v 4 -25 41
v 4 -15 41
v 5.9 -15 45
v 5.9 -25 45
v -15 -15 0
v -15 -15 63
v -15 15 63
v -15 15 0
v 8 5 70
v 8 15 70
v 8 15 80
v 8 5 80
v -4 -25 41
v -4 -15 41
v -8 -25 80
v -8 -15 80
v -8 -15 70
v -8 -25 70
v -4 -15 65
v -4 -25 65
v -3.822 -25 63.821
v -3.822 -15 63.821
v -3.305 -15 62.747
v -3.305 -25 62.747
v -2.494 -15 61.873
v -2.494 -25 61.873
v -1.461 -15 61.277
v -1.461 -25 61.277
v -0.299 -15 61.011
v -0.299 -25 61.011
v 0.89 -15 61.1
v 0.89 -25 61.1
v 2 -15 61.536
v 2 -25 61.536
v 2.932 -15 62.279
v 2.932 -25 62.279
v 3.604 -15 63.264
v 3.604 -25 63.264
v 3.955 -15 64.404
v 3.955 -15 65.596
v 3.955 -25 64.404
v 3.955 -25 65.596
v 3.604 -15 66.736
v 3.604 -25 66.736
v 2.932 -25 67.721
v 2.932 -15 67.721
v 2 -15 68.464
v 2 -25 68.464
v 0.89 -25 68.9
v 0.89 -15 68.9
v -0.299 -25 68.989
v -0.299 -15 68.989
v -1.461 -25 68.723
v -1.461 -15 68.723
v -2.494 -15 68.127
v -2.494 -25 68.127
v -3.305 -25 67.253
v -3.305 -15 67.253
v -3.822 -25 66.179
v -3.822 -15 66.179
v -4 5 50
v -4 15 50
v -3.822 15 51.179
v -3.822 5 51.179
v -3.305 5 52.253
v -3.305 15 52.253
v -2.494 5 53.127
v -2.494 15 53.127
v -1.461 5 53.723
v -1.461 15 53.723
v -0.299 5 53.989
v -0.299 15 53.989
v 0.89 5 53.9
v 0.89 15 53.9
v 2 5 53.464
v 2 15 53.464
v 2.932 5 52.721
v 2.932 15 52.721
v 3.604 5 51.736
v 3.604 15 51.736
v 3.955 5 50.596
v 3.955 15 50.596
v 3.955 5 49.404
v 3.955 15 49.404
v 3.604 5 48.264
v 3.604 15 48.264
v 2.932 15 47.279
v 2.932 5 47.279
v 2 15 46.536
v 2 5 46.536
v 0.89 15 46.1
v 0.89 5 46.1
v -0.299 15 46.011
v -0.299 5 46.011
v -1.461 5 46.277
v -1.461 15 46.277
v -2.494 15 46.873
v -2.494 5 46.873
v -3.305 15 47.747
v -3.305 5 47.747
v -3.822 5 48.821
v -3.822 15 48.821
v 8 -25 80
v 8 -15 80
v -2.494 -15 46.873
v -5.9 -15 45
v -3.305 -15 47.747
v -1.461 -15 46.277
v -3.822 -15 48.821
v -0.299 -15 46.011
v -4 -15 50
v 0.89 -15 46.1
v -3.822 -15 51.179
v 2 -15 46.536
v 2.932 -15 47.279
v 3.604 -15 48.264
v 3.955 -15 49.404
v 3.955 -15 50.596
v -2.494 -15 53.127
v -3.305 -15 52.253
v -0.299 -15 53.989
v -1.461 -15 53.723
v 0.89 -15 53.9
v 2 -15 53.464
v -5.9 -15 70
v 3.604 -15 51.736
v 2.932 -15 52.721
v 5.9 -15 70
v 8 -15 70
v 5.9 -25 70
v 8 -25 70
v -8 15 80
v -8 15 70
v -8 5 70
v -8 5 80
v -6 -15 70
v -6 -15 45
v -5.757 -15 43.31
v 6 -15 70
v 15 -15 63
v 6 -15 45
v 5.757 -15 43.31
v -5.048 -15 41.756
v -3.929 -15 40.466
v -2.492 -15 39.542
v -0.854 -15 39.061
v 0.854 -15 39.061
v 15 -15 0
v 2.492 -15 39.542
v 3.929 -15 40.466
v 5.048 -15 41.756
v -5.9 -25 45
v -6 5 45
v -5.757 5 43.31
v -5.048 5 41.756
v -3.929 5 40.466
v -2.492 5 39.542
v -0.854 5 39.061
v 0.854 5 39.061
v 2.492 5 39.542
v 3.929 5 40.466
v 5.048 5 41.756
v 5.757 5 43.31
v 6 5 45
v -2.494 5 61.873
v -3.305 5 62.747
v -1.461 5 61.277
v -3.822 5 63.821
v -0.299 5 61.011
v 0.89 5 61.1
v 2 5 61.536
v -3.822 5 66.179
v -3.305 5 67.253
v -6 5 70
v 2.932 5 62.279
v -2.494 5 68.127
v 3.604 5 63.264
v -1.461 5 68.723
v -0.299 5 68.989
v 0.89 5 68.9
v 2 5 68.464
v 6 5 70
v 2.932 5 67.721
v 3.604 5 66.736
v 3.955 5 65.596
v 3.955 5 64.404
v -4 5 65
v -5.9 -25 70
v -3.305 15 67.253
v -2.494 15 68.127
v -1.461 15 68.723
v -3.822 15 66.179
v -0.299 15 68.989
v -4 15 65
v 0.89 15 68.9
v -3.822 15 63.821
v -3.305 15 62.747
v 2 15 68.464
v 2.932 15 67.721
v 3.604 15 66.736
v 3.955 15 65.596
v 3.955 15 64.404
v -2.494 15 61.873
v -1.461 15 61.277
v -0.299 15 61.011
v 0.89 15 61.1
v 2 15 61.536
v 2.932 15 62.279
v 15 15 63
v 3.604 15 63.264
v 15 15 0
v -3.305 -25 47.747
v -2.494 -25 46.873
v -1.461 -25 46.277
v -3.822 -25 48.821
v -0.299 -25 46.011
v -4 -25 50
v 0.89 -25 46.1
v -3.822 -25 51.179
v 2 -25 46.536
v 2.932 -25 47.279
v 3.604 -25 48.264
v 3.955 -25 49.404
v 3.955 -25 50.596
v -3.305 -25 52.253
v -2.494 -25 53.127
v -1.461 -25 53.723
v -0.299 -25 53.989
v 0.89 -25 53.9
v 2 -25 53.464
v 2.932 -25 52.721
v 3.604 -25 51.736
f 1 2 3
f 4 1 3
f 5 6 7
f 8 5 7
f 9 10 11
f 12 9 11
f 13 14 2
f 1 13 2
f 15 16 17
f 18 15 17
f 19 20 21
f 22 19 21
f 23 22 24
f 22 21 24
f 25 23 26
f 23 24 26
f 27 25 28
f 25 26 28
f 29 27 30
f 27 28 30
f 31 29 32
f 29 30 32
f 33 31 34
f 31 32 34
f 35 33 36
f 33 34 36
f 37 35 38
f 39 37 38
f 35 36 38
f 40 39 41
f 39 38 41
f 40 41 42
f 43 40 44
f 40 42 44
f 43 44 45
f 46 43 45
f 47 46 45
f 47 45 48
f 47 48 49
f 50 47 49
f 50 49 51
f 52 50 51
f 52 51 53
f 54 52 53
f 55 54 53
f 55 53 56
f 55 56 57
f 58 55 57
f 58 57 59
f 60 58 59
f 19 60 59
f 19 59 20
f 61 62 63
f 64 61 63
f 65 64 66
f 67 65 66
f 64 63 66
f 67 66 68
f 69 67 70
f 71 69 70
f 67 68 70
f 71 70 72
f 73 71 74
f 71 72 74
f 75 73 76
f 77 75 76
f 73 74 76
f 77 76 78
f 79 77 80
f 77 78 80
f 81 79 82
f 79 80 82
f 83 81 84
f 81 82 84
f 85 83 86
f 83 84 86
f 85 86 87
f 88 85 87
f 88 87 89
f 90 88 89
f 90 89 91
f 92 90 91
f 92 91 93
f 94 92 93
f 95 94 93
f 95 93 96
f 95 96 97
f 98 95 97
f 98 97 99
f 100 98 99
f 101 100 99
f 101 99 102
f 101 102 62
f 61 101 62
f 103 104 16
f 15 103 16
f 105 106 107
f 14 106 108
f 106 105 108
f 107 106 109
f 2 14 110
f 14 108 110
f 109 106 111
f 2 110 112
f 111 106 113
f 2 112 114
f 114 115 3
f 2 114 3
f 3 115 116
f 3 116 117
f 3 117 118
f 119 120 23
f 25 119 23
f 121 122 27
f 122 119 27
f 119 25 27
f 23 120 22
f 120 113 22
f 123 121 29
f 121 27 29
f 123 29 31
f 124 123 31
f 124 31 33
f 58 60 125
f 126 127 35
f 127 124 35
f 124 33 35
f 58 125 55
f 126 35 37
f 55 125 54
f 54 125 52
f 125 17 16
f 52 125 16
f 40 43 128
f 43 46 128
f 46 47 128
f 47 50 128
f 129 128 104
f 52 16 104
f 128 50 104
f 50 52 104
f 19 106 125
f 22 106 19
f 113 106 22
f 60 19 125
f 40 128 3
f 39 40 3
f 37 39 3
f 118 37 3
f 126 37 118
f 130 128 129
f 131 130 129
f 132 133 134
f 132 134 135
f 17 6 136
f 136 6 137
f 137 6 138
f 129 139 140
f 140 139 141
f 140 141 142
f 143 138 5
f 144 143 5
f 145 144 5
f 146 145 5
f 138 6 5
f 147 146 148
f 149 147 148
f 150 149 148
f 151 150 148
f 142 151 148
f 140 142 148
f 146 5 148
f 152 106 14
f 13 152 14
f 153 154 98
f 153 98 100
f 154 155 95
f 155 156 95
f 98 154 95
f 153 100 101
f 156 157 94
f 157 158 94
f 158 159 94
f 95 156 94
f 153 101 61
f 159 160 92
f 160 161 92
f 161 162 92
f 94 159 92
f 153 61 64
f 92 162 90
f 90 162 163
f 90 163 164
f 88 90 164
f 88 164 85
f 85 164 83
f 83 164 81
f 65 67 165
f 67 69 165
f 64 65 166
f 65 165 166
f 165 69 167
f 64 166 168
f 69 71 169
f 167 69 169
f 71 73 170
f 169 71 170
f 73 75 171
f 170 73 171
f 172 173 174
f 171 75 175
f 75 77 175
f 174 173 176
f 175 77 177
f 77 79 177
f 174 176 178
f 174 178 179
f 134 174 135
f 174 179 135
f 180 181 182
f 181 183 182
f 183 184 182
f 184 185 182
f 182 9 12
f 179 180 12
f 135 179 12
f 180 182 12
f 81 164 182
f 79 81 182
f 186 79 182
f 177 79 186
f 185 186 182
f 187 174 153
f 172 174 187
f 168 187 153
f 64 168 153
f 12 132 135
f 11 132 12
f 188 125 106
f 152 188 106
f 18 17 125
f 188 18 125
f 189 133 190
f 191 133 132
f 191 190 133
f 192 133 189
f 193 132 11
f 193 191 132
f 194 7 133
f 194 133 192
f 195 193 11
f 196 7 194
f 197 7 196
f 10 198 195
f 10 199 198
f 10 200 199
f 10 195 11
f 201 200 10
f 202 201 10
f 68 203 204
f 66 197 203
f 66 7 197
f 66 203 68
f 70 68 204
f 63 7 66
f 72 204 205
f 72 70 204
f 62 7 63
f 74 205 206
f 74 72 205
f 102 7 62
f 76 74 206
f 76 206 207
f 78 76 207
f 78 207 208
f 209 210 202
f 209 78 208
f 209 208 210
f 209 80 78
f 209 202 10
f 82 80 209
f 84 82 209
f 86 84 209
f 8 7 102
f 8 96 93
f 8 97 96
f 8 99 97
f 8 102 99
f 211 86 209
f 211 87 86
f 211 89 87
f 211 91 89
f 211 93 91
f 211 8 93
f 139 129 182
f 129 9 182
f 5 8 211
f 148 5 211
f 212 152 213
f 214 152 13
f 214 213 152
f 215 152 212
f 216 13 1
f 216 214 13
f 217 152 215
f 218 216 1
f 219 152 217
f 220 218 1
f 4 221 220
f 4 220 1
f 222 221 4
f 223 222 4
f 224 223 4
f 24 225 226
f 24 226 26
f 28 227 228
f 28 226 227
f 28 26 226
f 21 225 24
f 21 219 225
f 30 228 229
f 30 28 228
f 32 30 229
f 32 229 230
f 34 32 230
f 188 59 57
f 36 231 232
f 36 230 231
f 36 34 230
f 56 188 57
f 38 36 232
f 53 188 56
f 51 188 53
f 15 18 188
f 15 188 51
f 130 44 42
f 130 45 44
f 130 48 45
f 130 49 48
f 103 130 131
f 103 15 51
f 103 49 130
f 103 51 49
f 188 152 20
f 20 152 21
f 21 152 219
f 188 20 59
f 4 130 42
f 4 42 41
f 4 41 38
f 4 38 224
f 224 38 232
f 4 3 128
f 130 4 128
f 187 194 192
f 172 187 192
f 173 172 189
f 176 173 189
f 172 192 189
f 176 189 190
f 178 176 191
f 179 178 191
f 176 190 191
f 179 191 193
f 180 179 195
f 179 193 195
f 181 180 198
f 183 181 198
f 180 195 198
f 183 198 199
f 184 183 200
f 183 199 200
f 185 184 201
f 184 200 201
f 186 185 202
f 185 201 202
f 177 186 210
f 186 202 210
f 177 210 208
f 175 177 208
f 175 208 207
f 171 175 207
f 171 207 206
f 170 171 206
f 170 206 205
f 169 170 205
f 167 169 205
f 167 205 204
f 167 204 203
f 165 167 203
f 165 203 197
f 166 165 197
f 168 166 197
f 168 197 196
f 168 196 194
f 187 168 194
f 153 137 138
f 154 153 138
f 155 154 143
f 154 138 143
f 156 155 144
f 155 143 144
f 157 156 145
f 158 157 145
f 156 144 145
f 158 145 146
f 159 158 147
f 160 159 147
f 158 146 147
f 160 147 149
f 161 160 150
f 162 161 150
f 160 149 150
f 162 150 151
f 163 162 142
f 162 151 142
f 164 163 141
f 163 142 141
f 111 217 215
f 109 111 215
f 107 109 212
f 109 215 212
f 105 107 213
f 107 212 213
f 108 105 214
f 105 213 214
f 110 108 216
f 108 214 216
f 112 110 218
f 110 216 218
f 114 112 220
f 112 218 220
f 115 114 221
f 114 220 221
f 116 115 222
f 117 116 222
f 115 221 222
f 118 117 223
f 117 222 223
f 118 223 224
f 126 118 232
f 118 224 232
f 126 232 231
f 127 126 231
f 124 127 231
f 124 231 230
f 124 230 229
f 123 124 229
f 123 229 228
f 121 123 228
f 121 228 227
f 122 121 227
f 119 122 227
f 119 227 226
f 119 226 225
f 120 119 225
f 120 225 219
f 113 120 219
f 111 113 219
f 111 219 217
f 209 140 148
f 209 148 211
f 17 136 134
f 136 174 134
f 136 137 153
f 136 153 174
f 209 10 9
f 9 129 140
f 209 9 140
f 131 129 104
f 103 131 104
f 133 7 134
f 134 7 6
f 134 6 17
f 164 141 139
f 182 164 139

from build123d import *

# Parameters (mm, degrees)
F0_W      = 30
F0_H      = 30
F1_DEPTH  = 80
F2_W      = 20
F2_H      = 10
F3_DEPTH  = 30.001
F4_W      = 7
F4_H      = 10
F5_DEPTH  = 30.001
F7_DEPTH  = 30.001
F8_W      = 12
F8_H      = 25
F9_DEPTH  = 20
F11_D     = 8
F13_DEPTH = 10
F14_D     = 8


with BuildPart() as f1:
    # F0 (on Top) → F1 (new body)
    with BuildSketch(Plane.XY):
        Rectangle(F0_W, F0_H)
    extrude(amount=F1_DEPTH)

    # F2 (on face) → F3 (cut, through all)
    with BuildSketch(Plane.YZ.offset(15)):
        with Locations((-5, 75)):
            Rectangle(F2_W, F2_H)
    extrude(amount=-F3_DEPTH, mode=Mode.SUBTRACT)

    # F4 (on face) → F5 (cut, through all)
    with BuildSketch(Plane(origin=(0, 15, 0), x_dir=(-1, 0, 0), z_dir=(0, 1, 0))):
        with Locations((-11.5, 75)):
            Rectangle(F4_W, F4_H)
        with Locations((11.5, 75)):
            Rectangle(F4_W, F4_H)
    extrude(amount=-F5_DEPTH, mode=Mode.SUBTRACT)

    # F6 (on face) → F7 (cut, through all)
    with BuildSketch(Plane.XZ.offset(15)):
        Polygon((15, 70), (8, 70), (15, 63), align=None)
        Polygon((-15, 63), (-8, 70), (-15, 70), align=None)
    extrude(amount=-F7_DEPTH, mode=Mode.SUBTRACT)

    # F8 (on face) → F9 (cut)
    with BuildSketch(Plane.XZ.offset(15)):
        with Locations((0, 57.5)):
            Rectangle(F8_W, F8_H)
        with BuildLine():
            Line((6, 45), (-6, 45))
            ThreePointArc((-6, 45), (0, 39), (6, 45))
        make_face()
    extrude(amount=-F9_DEPTH, mode=Mode.SUBTRACT)

    # F11 (through all)
    with Locations(Plane.XZ.offset(-5)):
        with Locations((0, 65), (0, 50)):
            Hole(F11_D / 2)


with BuildPart() as f13:
    # F12 (on face) → F13 (new body)
    with BuildSketch(Plane.XZ.offset(15)):
        Polygon((-8, 80), (-8, 70), (-5.9, 70), (-5.9, 45), (5.9, 45), (5.9, 70), (8, 70), (8, 80), align=None)
        Polygon((5.9, 45), (-5.9, 45), (-4, 41), (4, 41), align=None)
    extrude(amount=F13_DEPTH)

    # F14 (through all)
    with Locations(Plane(origin=(0, 5, 0), x_dir=(1, 0, 0), z_dir=(0, 1, 0))):
        with Locations((0, -65), (0, -50)):
            Hole(F14_D / 2)


solid = Compound([f1.part, f13.part])
